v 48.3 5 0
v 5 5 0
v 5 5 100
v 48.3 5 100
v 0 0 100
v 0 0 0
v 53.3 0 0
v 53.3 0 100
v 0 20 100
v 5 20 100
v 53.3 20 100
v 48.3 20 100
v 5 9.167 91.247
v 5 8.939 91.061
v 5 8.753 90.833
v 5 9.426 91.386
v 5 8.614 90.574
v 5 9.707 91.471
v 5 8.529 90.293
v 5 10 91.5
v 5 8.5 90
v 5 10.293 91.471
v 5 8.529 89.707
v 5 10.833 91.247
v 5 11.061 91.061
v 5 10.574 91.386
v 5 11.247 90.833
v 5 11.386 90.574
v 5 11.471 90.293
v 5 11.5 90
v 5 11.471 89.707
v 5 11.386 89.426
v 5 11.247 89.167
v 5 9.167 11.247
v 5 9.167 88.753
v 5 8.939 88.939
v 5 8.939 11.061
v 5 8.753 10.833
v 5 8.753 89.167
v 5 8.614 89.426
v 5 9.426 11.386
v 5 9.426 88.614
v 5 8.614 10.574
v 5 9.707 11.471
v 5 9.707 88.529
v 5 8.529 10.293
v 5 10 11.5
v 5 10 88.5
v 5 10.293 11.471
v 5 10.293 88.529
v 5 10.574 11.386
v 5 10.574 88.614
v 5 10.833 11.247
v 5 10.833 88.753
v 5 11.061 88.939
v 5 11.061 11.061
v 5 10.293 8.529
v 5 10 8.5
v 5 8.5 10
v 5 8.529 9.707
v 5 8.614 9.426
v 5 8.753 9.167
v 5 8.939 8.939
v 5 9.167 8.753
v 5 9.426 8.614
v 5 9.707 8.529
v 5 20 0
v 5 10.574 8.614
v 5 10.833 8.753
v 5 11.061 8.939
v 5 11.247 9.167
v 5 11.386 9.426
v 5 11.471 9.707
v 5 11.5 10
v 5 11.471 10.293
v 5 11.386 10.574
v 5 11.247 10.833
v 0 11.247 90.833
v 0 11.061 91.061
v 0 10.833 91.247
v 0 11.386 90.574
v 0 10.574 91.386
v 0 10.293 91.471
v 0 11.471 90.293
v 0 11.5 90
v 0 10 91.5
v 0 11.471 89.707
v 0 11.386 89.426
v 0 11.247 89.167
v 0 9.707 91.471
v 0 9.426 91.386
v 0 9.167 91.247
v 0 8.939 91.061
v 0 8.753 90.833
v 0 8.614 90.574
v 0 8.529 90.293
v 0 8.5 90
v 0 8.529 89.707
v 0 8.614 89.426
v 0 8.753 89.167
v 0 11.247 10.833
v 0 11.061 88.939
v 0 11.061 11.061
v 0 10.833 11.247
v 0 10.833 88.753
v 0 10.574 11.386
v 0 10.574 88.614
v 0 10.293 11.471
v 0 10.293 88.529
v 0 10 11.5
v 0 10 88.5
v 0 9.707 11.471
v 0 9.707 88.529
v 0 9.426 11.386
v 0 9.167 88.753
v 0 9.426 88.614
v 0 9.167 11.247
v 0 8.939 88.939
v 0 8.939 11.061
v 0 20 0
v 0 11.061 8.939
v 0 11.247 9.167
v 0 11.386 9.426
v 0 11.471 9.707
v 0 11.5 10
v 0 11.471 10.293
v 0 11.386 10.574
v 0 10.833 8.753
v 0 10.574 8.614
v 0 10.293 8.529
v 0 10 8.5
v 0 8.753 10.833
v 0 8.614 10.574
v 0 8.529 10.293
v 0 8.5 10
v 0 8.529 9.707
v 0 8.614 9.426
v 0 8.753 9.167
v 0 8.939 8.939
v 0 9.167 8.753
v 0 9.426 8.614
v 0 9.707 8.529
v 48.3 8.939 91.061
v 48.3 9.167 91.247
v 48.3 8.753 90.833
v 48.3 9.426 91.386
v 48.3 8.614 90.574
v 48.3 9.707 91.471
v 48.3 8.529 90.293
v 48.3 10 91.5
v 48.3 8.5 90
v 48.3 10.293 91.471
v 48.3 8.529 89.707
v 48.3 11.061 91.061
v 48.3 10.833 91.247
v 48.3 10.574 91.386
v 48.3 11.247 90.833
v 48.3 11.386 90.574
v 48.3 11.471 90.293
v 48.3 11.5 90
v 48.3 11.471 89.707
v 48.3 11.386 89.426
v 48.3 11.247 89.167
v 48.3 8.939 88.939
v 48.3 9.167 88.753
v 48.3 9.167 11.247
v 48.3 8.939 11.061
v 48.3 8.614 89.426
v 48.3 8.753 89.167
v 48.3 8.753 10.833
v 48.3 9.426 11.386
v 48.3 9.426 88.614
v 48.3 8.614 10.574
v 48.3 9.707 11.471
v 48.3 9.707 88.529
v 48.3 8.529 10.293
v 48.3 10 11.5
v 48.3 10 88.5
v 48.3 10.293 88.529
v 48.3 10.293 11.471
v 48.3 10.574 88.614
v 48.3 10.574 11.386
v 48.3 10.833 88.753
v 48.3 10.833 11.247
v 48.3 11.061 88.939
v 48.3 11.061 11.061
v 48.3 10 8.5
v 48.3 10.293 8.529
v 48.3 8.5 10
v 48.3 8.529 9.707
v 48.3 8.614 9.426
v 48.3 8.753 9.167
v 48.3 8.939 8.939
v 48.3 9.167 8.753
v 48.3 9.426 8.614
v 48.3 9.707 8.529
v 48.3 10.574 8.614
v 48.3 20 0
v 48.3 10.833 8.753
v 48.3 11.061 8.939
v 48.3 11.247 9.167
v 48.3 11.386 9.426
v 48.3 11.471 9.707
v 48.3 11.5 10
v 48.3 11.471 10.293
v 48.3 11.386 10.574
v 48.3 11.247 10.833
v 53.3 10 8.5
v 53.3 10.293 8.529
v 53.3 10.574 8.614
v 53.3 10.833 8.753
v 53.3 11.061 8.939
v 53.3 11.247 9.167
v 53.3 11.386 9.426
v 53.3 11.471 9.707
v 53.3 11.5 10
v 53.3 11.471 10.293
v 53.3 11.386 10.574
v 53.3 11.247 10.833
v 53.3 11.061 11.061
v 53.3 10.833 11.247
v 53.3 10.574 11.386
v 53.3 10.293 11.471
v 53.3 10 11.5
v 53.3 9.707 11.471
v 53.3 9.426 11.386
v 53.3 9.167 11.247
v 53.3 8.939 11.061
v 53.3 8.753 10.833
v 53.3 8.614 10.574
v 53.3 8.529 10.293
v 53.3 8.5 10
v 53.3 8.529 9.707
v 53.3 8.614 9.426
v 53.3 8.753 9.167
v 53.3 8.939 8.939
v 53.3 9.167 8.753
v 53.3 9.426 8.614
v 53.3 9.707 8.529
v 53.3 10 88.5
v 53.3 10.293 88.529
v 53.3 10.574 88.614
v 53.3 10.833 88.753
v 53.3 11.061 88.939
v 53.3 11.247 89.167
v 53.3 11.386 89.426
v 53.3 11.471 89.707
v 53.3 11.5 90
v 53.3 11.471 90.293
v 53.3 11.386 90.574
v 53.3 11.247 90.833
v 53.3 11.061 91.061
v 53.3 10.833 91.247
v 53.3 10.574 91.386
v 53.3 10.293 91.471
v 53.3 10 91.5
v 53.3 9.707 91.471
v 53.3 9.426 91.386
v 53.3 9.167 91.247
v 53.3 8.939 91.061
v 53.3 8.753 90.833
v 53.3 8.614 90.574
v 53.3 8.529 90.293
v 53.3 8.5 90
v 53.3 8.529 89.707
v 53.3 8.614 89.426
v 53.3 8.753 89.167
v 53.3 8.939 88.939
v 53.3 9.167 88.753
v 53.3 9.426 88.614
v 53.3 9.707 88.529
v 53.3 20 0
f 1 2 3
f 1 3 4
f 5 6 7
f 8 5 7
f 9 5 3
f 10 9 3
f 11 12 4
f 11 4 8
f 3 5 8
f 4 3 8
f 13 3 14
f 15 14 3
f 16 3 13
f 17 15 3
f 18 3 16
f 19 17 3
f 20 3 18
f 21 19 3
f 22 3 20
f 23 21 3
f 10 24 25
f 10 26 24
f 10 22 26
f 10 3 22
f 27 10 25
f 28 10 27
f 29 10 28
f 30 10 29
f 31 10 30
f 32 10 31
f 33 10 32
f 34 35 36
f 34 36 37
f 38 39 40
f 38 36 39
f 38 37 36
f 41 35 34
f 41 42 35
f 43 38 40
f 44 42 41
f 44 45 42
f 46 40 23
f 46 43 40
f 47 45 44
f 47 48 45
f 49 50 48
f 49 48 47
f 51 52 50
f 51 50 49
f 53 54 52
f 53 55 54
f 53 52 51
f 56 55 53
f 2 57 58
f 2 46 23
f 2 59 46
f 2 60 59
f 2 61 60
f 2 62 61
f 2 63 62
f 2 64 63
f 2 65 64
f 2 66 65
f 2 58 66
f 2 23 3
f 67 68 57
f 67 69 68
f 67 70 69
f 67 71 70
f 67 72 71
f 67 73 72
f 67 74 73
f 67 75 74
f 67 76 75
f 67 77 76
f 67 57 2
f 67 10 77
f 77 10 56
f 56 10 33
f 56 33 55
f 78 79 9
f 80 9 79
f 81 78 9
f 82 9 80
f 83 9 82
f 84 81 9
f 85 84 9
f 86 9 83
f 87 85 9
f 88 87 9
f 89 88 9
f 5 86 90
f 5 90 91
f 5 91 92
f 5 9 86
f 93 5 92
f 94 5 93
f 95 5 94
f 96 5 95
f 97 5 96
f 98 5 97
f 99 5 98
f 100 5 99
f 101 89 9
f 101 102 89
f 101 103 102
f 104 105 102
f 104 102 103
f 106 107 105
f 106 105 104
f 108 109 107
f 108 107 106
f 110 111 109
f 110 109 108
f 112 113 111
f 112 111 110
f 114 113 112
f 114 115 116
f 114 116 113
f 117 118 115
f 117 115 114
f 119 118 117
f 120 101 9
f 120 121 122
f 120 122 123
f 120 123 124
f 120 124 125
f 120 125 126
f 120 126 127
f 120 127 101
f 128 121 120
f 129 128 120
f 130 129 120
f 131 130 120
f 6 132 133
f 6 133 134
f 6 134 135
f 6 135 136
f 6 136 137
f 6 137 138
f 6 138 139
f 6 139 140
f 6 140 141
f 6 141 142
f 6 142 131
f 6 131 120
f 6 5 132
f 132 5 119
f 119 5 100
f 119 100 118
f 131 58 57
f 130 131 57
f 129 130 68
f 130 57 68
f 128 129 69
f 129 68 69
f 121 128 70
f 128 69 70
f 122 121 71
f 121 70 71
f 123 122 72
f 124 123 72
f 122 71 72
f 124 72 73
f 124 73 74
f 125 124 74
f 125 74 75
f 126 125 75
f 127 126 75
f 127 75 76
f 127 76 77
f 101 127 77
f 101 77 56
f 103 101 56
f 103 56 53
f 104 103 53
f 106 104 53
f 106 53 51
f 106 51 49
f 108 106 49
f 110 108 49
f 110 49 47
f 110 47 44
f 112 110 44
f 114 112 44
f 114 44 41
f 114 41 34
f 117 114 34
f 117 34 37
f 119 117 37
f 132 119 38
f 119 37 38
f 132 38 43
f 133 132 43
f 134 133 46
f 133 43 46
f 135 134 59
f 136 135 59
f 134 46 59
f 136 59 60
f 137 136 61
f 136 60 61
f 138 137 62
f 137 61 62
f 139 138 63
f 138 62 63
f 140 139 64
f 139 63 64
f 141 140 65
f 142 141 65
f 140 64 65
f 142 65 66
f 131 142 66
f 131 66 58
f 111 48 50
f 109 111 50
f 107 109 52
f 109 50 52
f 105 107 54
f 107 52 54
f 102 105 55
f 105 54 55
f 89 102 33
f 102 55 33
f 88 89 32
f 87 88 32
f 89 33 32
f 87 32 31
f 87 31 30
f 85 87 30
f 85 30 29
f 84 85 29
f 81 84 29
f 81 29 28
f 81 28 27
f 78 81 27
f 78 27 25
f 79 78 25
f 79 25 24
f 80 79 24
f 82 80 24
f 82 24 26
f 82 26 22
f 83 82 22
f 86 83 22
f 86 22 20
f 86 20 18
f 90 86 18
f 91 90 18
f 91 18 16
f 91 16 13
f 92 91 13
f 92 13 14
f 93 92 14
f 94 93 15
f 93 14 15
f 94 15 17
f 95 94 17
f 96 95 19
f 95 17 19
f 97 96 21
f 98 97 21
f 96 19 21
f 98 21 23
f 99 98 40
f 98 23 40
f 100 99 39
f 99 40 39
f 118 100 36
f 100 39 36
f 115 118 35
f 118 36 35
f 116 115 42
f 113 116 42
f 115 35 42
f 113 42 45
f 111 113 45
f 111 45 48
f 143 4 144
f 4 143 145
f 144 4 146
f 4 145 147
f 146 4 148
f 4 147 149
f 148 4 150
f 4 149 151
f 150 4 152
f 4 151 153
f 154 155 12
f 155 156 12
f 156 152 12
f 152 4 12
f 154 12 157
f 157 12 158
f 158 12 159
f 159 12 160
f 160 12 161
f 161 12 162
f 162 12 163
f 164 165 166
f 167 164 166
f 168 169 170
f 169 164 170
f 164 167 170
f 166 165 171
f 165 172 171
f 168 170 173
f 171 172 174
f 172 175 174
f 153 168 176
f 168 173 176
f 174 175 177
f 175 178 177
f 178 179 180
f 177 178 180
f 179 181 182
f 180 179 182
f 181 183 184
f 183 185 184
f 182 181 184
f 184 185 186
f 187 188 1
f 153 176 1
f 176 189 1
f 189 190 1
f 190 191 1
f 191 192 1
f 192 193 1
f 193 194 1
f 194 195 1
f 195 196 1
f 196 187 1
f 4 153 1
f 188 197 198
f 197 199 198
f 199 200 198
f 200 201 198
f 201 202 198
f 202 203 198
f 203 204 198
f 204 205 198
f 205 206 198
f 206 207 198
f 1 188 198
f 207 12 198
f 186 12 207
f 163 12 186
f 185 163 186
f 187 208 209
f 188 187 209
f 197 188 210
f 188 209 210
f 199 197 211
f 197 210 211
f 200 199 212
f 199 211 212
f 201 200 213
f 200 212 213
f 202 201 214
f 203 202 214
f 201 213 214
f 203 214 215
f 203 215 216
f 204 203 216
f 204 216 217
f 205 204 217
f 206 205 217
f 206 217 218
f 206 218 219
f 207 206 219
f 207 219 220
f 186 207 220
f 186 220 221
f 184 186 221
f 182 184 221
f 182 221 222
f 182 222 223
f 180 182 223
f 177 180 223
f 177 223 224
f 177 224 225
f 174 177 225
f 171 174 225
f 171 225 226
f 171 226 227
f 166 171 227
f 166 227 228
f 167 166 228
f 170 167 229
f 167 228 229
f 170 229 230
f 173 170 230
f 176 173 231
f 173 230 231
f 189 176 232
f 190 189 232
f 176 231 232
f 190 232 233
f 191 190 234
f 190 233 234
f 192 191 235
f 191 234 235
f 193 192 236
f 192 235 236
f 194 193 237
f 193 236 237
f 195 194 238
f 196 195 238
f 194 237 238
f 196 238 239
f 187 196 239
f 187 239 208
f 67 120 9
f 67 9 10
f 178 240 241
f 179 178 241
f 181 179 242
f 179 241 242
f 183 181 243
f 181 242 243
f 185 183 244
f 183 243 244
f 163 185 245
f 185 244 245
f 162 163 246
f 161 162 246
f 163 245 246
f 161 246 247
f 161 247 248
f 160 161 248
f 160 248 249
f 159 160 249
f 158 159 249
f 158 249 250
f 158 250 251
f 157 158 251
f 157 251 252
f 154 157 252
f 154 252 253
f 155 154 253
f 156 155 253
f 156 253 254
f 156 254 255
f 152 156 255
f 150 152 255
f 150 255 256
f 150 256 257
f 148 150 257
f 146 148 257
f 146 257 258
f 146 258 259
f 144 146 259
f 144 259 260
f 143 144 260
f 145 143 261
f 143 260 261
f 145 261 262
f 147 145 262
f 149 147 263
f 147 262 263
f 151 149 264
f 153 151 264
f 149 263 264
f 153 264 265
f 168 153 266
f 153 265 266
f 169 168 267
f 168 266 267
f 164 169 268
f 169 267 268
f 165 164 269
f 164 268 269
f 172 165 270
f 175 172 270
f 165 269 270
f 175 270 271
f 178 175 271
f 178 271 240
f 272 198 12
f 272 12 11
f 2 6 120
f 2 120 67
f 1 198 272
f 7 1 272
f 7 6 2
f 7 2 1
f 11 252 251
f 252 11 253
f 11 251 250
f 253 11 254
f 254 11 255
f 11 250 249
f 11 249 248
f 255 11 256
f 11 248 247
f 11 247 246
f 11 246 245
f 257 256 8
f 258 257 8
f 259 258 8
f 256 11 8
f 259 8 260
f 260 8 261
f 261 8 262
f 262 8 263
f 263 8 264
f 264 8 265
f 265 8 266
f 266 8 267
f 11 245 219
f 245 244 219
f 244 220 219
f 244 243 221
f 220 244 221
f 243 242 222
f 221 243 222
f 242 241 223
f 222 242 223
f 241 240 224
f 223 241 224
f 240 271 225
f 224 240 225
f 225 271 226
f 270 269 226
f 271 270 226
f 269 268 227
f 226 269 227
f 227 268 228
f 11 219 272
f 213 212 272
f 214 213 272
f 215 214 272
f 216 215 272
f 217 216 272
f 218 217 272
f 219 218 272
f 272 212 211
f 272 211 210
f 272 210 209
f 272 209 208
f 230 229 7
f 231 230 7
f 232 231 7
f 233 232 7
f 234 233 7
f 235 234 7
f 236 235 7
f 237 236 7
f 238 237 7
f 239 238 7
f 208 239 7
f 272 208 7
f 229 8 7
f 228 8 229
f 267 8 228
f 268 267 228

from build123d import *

# Parameters (mm, degrees)
ESQUISSE1_W             = 53.3
ESQUISSE1_H             = 100
BOSS_EXTRU_1_DEPTH      = 20
ESQUISSE2_W             = 43.3
ESQUISSE2_H             = 100
ENL_V_MAT_EXTRU_1_DEPTH = 15
ESQUISSE3_R             = 1.5
ENL_V_MAT_EXTRU_2_DEPTH = 54.3


with BuildPart() as part:
    # Esquisse1 → Boss.-Extru.1 (new body)
    with BuildSketch(Plane(origin=(0, 0, 0), x_dir=(1, 0, 0), z_dir=(0, 1, 0))):
        with Locations((26.65, -50)):
            Rectangle(ESQUISSE1_W, ESQUISSE1_H)
    extrude(amount=BOSS_EXTRU_1_DEPTH)

    # Esquisse2 → Enlèv. mat.-Extru.1 (cut)
    with BuildSketch(Plane(origin=(0, 20, 0), x_dir=(1, 0, 0), z_dir=(0, 1, 0))):
        with Locations((26.65, -50)):
            Rectangle(ESQUISSE2_W, ESQUISSE2_H)
    extrude(amount=-ENL_V_MAT_EXTRU_1_DEPTH, mode=Mode.SUBTRACT)

    # Esquisse3 → Enlèv. mat.-Extru.2 (cut, through all)
    with BuildSketch(Plane(origin=(53.3, 0, 0), x_dir=(0, 0, -1), z_dir=(1, 0, 0))):
        with Locations((-90, 10)):
            Circle(ESQUISSE3_R)
        with Locations((-10, 10)):
            Circle(ESQUISSE3_R)
    extrude(amount=-ENL_V_MAT_EXTRU_2_DEPTH, mode=Mode.SUBTRACT)


solid = part.part
